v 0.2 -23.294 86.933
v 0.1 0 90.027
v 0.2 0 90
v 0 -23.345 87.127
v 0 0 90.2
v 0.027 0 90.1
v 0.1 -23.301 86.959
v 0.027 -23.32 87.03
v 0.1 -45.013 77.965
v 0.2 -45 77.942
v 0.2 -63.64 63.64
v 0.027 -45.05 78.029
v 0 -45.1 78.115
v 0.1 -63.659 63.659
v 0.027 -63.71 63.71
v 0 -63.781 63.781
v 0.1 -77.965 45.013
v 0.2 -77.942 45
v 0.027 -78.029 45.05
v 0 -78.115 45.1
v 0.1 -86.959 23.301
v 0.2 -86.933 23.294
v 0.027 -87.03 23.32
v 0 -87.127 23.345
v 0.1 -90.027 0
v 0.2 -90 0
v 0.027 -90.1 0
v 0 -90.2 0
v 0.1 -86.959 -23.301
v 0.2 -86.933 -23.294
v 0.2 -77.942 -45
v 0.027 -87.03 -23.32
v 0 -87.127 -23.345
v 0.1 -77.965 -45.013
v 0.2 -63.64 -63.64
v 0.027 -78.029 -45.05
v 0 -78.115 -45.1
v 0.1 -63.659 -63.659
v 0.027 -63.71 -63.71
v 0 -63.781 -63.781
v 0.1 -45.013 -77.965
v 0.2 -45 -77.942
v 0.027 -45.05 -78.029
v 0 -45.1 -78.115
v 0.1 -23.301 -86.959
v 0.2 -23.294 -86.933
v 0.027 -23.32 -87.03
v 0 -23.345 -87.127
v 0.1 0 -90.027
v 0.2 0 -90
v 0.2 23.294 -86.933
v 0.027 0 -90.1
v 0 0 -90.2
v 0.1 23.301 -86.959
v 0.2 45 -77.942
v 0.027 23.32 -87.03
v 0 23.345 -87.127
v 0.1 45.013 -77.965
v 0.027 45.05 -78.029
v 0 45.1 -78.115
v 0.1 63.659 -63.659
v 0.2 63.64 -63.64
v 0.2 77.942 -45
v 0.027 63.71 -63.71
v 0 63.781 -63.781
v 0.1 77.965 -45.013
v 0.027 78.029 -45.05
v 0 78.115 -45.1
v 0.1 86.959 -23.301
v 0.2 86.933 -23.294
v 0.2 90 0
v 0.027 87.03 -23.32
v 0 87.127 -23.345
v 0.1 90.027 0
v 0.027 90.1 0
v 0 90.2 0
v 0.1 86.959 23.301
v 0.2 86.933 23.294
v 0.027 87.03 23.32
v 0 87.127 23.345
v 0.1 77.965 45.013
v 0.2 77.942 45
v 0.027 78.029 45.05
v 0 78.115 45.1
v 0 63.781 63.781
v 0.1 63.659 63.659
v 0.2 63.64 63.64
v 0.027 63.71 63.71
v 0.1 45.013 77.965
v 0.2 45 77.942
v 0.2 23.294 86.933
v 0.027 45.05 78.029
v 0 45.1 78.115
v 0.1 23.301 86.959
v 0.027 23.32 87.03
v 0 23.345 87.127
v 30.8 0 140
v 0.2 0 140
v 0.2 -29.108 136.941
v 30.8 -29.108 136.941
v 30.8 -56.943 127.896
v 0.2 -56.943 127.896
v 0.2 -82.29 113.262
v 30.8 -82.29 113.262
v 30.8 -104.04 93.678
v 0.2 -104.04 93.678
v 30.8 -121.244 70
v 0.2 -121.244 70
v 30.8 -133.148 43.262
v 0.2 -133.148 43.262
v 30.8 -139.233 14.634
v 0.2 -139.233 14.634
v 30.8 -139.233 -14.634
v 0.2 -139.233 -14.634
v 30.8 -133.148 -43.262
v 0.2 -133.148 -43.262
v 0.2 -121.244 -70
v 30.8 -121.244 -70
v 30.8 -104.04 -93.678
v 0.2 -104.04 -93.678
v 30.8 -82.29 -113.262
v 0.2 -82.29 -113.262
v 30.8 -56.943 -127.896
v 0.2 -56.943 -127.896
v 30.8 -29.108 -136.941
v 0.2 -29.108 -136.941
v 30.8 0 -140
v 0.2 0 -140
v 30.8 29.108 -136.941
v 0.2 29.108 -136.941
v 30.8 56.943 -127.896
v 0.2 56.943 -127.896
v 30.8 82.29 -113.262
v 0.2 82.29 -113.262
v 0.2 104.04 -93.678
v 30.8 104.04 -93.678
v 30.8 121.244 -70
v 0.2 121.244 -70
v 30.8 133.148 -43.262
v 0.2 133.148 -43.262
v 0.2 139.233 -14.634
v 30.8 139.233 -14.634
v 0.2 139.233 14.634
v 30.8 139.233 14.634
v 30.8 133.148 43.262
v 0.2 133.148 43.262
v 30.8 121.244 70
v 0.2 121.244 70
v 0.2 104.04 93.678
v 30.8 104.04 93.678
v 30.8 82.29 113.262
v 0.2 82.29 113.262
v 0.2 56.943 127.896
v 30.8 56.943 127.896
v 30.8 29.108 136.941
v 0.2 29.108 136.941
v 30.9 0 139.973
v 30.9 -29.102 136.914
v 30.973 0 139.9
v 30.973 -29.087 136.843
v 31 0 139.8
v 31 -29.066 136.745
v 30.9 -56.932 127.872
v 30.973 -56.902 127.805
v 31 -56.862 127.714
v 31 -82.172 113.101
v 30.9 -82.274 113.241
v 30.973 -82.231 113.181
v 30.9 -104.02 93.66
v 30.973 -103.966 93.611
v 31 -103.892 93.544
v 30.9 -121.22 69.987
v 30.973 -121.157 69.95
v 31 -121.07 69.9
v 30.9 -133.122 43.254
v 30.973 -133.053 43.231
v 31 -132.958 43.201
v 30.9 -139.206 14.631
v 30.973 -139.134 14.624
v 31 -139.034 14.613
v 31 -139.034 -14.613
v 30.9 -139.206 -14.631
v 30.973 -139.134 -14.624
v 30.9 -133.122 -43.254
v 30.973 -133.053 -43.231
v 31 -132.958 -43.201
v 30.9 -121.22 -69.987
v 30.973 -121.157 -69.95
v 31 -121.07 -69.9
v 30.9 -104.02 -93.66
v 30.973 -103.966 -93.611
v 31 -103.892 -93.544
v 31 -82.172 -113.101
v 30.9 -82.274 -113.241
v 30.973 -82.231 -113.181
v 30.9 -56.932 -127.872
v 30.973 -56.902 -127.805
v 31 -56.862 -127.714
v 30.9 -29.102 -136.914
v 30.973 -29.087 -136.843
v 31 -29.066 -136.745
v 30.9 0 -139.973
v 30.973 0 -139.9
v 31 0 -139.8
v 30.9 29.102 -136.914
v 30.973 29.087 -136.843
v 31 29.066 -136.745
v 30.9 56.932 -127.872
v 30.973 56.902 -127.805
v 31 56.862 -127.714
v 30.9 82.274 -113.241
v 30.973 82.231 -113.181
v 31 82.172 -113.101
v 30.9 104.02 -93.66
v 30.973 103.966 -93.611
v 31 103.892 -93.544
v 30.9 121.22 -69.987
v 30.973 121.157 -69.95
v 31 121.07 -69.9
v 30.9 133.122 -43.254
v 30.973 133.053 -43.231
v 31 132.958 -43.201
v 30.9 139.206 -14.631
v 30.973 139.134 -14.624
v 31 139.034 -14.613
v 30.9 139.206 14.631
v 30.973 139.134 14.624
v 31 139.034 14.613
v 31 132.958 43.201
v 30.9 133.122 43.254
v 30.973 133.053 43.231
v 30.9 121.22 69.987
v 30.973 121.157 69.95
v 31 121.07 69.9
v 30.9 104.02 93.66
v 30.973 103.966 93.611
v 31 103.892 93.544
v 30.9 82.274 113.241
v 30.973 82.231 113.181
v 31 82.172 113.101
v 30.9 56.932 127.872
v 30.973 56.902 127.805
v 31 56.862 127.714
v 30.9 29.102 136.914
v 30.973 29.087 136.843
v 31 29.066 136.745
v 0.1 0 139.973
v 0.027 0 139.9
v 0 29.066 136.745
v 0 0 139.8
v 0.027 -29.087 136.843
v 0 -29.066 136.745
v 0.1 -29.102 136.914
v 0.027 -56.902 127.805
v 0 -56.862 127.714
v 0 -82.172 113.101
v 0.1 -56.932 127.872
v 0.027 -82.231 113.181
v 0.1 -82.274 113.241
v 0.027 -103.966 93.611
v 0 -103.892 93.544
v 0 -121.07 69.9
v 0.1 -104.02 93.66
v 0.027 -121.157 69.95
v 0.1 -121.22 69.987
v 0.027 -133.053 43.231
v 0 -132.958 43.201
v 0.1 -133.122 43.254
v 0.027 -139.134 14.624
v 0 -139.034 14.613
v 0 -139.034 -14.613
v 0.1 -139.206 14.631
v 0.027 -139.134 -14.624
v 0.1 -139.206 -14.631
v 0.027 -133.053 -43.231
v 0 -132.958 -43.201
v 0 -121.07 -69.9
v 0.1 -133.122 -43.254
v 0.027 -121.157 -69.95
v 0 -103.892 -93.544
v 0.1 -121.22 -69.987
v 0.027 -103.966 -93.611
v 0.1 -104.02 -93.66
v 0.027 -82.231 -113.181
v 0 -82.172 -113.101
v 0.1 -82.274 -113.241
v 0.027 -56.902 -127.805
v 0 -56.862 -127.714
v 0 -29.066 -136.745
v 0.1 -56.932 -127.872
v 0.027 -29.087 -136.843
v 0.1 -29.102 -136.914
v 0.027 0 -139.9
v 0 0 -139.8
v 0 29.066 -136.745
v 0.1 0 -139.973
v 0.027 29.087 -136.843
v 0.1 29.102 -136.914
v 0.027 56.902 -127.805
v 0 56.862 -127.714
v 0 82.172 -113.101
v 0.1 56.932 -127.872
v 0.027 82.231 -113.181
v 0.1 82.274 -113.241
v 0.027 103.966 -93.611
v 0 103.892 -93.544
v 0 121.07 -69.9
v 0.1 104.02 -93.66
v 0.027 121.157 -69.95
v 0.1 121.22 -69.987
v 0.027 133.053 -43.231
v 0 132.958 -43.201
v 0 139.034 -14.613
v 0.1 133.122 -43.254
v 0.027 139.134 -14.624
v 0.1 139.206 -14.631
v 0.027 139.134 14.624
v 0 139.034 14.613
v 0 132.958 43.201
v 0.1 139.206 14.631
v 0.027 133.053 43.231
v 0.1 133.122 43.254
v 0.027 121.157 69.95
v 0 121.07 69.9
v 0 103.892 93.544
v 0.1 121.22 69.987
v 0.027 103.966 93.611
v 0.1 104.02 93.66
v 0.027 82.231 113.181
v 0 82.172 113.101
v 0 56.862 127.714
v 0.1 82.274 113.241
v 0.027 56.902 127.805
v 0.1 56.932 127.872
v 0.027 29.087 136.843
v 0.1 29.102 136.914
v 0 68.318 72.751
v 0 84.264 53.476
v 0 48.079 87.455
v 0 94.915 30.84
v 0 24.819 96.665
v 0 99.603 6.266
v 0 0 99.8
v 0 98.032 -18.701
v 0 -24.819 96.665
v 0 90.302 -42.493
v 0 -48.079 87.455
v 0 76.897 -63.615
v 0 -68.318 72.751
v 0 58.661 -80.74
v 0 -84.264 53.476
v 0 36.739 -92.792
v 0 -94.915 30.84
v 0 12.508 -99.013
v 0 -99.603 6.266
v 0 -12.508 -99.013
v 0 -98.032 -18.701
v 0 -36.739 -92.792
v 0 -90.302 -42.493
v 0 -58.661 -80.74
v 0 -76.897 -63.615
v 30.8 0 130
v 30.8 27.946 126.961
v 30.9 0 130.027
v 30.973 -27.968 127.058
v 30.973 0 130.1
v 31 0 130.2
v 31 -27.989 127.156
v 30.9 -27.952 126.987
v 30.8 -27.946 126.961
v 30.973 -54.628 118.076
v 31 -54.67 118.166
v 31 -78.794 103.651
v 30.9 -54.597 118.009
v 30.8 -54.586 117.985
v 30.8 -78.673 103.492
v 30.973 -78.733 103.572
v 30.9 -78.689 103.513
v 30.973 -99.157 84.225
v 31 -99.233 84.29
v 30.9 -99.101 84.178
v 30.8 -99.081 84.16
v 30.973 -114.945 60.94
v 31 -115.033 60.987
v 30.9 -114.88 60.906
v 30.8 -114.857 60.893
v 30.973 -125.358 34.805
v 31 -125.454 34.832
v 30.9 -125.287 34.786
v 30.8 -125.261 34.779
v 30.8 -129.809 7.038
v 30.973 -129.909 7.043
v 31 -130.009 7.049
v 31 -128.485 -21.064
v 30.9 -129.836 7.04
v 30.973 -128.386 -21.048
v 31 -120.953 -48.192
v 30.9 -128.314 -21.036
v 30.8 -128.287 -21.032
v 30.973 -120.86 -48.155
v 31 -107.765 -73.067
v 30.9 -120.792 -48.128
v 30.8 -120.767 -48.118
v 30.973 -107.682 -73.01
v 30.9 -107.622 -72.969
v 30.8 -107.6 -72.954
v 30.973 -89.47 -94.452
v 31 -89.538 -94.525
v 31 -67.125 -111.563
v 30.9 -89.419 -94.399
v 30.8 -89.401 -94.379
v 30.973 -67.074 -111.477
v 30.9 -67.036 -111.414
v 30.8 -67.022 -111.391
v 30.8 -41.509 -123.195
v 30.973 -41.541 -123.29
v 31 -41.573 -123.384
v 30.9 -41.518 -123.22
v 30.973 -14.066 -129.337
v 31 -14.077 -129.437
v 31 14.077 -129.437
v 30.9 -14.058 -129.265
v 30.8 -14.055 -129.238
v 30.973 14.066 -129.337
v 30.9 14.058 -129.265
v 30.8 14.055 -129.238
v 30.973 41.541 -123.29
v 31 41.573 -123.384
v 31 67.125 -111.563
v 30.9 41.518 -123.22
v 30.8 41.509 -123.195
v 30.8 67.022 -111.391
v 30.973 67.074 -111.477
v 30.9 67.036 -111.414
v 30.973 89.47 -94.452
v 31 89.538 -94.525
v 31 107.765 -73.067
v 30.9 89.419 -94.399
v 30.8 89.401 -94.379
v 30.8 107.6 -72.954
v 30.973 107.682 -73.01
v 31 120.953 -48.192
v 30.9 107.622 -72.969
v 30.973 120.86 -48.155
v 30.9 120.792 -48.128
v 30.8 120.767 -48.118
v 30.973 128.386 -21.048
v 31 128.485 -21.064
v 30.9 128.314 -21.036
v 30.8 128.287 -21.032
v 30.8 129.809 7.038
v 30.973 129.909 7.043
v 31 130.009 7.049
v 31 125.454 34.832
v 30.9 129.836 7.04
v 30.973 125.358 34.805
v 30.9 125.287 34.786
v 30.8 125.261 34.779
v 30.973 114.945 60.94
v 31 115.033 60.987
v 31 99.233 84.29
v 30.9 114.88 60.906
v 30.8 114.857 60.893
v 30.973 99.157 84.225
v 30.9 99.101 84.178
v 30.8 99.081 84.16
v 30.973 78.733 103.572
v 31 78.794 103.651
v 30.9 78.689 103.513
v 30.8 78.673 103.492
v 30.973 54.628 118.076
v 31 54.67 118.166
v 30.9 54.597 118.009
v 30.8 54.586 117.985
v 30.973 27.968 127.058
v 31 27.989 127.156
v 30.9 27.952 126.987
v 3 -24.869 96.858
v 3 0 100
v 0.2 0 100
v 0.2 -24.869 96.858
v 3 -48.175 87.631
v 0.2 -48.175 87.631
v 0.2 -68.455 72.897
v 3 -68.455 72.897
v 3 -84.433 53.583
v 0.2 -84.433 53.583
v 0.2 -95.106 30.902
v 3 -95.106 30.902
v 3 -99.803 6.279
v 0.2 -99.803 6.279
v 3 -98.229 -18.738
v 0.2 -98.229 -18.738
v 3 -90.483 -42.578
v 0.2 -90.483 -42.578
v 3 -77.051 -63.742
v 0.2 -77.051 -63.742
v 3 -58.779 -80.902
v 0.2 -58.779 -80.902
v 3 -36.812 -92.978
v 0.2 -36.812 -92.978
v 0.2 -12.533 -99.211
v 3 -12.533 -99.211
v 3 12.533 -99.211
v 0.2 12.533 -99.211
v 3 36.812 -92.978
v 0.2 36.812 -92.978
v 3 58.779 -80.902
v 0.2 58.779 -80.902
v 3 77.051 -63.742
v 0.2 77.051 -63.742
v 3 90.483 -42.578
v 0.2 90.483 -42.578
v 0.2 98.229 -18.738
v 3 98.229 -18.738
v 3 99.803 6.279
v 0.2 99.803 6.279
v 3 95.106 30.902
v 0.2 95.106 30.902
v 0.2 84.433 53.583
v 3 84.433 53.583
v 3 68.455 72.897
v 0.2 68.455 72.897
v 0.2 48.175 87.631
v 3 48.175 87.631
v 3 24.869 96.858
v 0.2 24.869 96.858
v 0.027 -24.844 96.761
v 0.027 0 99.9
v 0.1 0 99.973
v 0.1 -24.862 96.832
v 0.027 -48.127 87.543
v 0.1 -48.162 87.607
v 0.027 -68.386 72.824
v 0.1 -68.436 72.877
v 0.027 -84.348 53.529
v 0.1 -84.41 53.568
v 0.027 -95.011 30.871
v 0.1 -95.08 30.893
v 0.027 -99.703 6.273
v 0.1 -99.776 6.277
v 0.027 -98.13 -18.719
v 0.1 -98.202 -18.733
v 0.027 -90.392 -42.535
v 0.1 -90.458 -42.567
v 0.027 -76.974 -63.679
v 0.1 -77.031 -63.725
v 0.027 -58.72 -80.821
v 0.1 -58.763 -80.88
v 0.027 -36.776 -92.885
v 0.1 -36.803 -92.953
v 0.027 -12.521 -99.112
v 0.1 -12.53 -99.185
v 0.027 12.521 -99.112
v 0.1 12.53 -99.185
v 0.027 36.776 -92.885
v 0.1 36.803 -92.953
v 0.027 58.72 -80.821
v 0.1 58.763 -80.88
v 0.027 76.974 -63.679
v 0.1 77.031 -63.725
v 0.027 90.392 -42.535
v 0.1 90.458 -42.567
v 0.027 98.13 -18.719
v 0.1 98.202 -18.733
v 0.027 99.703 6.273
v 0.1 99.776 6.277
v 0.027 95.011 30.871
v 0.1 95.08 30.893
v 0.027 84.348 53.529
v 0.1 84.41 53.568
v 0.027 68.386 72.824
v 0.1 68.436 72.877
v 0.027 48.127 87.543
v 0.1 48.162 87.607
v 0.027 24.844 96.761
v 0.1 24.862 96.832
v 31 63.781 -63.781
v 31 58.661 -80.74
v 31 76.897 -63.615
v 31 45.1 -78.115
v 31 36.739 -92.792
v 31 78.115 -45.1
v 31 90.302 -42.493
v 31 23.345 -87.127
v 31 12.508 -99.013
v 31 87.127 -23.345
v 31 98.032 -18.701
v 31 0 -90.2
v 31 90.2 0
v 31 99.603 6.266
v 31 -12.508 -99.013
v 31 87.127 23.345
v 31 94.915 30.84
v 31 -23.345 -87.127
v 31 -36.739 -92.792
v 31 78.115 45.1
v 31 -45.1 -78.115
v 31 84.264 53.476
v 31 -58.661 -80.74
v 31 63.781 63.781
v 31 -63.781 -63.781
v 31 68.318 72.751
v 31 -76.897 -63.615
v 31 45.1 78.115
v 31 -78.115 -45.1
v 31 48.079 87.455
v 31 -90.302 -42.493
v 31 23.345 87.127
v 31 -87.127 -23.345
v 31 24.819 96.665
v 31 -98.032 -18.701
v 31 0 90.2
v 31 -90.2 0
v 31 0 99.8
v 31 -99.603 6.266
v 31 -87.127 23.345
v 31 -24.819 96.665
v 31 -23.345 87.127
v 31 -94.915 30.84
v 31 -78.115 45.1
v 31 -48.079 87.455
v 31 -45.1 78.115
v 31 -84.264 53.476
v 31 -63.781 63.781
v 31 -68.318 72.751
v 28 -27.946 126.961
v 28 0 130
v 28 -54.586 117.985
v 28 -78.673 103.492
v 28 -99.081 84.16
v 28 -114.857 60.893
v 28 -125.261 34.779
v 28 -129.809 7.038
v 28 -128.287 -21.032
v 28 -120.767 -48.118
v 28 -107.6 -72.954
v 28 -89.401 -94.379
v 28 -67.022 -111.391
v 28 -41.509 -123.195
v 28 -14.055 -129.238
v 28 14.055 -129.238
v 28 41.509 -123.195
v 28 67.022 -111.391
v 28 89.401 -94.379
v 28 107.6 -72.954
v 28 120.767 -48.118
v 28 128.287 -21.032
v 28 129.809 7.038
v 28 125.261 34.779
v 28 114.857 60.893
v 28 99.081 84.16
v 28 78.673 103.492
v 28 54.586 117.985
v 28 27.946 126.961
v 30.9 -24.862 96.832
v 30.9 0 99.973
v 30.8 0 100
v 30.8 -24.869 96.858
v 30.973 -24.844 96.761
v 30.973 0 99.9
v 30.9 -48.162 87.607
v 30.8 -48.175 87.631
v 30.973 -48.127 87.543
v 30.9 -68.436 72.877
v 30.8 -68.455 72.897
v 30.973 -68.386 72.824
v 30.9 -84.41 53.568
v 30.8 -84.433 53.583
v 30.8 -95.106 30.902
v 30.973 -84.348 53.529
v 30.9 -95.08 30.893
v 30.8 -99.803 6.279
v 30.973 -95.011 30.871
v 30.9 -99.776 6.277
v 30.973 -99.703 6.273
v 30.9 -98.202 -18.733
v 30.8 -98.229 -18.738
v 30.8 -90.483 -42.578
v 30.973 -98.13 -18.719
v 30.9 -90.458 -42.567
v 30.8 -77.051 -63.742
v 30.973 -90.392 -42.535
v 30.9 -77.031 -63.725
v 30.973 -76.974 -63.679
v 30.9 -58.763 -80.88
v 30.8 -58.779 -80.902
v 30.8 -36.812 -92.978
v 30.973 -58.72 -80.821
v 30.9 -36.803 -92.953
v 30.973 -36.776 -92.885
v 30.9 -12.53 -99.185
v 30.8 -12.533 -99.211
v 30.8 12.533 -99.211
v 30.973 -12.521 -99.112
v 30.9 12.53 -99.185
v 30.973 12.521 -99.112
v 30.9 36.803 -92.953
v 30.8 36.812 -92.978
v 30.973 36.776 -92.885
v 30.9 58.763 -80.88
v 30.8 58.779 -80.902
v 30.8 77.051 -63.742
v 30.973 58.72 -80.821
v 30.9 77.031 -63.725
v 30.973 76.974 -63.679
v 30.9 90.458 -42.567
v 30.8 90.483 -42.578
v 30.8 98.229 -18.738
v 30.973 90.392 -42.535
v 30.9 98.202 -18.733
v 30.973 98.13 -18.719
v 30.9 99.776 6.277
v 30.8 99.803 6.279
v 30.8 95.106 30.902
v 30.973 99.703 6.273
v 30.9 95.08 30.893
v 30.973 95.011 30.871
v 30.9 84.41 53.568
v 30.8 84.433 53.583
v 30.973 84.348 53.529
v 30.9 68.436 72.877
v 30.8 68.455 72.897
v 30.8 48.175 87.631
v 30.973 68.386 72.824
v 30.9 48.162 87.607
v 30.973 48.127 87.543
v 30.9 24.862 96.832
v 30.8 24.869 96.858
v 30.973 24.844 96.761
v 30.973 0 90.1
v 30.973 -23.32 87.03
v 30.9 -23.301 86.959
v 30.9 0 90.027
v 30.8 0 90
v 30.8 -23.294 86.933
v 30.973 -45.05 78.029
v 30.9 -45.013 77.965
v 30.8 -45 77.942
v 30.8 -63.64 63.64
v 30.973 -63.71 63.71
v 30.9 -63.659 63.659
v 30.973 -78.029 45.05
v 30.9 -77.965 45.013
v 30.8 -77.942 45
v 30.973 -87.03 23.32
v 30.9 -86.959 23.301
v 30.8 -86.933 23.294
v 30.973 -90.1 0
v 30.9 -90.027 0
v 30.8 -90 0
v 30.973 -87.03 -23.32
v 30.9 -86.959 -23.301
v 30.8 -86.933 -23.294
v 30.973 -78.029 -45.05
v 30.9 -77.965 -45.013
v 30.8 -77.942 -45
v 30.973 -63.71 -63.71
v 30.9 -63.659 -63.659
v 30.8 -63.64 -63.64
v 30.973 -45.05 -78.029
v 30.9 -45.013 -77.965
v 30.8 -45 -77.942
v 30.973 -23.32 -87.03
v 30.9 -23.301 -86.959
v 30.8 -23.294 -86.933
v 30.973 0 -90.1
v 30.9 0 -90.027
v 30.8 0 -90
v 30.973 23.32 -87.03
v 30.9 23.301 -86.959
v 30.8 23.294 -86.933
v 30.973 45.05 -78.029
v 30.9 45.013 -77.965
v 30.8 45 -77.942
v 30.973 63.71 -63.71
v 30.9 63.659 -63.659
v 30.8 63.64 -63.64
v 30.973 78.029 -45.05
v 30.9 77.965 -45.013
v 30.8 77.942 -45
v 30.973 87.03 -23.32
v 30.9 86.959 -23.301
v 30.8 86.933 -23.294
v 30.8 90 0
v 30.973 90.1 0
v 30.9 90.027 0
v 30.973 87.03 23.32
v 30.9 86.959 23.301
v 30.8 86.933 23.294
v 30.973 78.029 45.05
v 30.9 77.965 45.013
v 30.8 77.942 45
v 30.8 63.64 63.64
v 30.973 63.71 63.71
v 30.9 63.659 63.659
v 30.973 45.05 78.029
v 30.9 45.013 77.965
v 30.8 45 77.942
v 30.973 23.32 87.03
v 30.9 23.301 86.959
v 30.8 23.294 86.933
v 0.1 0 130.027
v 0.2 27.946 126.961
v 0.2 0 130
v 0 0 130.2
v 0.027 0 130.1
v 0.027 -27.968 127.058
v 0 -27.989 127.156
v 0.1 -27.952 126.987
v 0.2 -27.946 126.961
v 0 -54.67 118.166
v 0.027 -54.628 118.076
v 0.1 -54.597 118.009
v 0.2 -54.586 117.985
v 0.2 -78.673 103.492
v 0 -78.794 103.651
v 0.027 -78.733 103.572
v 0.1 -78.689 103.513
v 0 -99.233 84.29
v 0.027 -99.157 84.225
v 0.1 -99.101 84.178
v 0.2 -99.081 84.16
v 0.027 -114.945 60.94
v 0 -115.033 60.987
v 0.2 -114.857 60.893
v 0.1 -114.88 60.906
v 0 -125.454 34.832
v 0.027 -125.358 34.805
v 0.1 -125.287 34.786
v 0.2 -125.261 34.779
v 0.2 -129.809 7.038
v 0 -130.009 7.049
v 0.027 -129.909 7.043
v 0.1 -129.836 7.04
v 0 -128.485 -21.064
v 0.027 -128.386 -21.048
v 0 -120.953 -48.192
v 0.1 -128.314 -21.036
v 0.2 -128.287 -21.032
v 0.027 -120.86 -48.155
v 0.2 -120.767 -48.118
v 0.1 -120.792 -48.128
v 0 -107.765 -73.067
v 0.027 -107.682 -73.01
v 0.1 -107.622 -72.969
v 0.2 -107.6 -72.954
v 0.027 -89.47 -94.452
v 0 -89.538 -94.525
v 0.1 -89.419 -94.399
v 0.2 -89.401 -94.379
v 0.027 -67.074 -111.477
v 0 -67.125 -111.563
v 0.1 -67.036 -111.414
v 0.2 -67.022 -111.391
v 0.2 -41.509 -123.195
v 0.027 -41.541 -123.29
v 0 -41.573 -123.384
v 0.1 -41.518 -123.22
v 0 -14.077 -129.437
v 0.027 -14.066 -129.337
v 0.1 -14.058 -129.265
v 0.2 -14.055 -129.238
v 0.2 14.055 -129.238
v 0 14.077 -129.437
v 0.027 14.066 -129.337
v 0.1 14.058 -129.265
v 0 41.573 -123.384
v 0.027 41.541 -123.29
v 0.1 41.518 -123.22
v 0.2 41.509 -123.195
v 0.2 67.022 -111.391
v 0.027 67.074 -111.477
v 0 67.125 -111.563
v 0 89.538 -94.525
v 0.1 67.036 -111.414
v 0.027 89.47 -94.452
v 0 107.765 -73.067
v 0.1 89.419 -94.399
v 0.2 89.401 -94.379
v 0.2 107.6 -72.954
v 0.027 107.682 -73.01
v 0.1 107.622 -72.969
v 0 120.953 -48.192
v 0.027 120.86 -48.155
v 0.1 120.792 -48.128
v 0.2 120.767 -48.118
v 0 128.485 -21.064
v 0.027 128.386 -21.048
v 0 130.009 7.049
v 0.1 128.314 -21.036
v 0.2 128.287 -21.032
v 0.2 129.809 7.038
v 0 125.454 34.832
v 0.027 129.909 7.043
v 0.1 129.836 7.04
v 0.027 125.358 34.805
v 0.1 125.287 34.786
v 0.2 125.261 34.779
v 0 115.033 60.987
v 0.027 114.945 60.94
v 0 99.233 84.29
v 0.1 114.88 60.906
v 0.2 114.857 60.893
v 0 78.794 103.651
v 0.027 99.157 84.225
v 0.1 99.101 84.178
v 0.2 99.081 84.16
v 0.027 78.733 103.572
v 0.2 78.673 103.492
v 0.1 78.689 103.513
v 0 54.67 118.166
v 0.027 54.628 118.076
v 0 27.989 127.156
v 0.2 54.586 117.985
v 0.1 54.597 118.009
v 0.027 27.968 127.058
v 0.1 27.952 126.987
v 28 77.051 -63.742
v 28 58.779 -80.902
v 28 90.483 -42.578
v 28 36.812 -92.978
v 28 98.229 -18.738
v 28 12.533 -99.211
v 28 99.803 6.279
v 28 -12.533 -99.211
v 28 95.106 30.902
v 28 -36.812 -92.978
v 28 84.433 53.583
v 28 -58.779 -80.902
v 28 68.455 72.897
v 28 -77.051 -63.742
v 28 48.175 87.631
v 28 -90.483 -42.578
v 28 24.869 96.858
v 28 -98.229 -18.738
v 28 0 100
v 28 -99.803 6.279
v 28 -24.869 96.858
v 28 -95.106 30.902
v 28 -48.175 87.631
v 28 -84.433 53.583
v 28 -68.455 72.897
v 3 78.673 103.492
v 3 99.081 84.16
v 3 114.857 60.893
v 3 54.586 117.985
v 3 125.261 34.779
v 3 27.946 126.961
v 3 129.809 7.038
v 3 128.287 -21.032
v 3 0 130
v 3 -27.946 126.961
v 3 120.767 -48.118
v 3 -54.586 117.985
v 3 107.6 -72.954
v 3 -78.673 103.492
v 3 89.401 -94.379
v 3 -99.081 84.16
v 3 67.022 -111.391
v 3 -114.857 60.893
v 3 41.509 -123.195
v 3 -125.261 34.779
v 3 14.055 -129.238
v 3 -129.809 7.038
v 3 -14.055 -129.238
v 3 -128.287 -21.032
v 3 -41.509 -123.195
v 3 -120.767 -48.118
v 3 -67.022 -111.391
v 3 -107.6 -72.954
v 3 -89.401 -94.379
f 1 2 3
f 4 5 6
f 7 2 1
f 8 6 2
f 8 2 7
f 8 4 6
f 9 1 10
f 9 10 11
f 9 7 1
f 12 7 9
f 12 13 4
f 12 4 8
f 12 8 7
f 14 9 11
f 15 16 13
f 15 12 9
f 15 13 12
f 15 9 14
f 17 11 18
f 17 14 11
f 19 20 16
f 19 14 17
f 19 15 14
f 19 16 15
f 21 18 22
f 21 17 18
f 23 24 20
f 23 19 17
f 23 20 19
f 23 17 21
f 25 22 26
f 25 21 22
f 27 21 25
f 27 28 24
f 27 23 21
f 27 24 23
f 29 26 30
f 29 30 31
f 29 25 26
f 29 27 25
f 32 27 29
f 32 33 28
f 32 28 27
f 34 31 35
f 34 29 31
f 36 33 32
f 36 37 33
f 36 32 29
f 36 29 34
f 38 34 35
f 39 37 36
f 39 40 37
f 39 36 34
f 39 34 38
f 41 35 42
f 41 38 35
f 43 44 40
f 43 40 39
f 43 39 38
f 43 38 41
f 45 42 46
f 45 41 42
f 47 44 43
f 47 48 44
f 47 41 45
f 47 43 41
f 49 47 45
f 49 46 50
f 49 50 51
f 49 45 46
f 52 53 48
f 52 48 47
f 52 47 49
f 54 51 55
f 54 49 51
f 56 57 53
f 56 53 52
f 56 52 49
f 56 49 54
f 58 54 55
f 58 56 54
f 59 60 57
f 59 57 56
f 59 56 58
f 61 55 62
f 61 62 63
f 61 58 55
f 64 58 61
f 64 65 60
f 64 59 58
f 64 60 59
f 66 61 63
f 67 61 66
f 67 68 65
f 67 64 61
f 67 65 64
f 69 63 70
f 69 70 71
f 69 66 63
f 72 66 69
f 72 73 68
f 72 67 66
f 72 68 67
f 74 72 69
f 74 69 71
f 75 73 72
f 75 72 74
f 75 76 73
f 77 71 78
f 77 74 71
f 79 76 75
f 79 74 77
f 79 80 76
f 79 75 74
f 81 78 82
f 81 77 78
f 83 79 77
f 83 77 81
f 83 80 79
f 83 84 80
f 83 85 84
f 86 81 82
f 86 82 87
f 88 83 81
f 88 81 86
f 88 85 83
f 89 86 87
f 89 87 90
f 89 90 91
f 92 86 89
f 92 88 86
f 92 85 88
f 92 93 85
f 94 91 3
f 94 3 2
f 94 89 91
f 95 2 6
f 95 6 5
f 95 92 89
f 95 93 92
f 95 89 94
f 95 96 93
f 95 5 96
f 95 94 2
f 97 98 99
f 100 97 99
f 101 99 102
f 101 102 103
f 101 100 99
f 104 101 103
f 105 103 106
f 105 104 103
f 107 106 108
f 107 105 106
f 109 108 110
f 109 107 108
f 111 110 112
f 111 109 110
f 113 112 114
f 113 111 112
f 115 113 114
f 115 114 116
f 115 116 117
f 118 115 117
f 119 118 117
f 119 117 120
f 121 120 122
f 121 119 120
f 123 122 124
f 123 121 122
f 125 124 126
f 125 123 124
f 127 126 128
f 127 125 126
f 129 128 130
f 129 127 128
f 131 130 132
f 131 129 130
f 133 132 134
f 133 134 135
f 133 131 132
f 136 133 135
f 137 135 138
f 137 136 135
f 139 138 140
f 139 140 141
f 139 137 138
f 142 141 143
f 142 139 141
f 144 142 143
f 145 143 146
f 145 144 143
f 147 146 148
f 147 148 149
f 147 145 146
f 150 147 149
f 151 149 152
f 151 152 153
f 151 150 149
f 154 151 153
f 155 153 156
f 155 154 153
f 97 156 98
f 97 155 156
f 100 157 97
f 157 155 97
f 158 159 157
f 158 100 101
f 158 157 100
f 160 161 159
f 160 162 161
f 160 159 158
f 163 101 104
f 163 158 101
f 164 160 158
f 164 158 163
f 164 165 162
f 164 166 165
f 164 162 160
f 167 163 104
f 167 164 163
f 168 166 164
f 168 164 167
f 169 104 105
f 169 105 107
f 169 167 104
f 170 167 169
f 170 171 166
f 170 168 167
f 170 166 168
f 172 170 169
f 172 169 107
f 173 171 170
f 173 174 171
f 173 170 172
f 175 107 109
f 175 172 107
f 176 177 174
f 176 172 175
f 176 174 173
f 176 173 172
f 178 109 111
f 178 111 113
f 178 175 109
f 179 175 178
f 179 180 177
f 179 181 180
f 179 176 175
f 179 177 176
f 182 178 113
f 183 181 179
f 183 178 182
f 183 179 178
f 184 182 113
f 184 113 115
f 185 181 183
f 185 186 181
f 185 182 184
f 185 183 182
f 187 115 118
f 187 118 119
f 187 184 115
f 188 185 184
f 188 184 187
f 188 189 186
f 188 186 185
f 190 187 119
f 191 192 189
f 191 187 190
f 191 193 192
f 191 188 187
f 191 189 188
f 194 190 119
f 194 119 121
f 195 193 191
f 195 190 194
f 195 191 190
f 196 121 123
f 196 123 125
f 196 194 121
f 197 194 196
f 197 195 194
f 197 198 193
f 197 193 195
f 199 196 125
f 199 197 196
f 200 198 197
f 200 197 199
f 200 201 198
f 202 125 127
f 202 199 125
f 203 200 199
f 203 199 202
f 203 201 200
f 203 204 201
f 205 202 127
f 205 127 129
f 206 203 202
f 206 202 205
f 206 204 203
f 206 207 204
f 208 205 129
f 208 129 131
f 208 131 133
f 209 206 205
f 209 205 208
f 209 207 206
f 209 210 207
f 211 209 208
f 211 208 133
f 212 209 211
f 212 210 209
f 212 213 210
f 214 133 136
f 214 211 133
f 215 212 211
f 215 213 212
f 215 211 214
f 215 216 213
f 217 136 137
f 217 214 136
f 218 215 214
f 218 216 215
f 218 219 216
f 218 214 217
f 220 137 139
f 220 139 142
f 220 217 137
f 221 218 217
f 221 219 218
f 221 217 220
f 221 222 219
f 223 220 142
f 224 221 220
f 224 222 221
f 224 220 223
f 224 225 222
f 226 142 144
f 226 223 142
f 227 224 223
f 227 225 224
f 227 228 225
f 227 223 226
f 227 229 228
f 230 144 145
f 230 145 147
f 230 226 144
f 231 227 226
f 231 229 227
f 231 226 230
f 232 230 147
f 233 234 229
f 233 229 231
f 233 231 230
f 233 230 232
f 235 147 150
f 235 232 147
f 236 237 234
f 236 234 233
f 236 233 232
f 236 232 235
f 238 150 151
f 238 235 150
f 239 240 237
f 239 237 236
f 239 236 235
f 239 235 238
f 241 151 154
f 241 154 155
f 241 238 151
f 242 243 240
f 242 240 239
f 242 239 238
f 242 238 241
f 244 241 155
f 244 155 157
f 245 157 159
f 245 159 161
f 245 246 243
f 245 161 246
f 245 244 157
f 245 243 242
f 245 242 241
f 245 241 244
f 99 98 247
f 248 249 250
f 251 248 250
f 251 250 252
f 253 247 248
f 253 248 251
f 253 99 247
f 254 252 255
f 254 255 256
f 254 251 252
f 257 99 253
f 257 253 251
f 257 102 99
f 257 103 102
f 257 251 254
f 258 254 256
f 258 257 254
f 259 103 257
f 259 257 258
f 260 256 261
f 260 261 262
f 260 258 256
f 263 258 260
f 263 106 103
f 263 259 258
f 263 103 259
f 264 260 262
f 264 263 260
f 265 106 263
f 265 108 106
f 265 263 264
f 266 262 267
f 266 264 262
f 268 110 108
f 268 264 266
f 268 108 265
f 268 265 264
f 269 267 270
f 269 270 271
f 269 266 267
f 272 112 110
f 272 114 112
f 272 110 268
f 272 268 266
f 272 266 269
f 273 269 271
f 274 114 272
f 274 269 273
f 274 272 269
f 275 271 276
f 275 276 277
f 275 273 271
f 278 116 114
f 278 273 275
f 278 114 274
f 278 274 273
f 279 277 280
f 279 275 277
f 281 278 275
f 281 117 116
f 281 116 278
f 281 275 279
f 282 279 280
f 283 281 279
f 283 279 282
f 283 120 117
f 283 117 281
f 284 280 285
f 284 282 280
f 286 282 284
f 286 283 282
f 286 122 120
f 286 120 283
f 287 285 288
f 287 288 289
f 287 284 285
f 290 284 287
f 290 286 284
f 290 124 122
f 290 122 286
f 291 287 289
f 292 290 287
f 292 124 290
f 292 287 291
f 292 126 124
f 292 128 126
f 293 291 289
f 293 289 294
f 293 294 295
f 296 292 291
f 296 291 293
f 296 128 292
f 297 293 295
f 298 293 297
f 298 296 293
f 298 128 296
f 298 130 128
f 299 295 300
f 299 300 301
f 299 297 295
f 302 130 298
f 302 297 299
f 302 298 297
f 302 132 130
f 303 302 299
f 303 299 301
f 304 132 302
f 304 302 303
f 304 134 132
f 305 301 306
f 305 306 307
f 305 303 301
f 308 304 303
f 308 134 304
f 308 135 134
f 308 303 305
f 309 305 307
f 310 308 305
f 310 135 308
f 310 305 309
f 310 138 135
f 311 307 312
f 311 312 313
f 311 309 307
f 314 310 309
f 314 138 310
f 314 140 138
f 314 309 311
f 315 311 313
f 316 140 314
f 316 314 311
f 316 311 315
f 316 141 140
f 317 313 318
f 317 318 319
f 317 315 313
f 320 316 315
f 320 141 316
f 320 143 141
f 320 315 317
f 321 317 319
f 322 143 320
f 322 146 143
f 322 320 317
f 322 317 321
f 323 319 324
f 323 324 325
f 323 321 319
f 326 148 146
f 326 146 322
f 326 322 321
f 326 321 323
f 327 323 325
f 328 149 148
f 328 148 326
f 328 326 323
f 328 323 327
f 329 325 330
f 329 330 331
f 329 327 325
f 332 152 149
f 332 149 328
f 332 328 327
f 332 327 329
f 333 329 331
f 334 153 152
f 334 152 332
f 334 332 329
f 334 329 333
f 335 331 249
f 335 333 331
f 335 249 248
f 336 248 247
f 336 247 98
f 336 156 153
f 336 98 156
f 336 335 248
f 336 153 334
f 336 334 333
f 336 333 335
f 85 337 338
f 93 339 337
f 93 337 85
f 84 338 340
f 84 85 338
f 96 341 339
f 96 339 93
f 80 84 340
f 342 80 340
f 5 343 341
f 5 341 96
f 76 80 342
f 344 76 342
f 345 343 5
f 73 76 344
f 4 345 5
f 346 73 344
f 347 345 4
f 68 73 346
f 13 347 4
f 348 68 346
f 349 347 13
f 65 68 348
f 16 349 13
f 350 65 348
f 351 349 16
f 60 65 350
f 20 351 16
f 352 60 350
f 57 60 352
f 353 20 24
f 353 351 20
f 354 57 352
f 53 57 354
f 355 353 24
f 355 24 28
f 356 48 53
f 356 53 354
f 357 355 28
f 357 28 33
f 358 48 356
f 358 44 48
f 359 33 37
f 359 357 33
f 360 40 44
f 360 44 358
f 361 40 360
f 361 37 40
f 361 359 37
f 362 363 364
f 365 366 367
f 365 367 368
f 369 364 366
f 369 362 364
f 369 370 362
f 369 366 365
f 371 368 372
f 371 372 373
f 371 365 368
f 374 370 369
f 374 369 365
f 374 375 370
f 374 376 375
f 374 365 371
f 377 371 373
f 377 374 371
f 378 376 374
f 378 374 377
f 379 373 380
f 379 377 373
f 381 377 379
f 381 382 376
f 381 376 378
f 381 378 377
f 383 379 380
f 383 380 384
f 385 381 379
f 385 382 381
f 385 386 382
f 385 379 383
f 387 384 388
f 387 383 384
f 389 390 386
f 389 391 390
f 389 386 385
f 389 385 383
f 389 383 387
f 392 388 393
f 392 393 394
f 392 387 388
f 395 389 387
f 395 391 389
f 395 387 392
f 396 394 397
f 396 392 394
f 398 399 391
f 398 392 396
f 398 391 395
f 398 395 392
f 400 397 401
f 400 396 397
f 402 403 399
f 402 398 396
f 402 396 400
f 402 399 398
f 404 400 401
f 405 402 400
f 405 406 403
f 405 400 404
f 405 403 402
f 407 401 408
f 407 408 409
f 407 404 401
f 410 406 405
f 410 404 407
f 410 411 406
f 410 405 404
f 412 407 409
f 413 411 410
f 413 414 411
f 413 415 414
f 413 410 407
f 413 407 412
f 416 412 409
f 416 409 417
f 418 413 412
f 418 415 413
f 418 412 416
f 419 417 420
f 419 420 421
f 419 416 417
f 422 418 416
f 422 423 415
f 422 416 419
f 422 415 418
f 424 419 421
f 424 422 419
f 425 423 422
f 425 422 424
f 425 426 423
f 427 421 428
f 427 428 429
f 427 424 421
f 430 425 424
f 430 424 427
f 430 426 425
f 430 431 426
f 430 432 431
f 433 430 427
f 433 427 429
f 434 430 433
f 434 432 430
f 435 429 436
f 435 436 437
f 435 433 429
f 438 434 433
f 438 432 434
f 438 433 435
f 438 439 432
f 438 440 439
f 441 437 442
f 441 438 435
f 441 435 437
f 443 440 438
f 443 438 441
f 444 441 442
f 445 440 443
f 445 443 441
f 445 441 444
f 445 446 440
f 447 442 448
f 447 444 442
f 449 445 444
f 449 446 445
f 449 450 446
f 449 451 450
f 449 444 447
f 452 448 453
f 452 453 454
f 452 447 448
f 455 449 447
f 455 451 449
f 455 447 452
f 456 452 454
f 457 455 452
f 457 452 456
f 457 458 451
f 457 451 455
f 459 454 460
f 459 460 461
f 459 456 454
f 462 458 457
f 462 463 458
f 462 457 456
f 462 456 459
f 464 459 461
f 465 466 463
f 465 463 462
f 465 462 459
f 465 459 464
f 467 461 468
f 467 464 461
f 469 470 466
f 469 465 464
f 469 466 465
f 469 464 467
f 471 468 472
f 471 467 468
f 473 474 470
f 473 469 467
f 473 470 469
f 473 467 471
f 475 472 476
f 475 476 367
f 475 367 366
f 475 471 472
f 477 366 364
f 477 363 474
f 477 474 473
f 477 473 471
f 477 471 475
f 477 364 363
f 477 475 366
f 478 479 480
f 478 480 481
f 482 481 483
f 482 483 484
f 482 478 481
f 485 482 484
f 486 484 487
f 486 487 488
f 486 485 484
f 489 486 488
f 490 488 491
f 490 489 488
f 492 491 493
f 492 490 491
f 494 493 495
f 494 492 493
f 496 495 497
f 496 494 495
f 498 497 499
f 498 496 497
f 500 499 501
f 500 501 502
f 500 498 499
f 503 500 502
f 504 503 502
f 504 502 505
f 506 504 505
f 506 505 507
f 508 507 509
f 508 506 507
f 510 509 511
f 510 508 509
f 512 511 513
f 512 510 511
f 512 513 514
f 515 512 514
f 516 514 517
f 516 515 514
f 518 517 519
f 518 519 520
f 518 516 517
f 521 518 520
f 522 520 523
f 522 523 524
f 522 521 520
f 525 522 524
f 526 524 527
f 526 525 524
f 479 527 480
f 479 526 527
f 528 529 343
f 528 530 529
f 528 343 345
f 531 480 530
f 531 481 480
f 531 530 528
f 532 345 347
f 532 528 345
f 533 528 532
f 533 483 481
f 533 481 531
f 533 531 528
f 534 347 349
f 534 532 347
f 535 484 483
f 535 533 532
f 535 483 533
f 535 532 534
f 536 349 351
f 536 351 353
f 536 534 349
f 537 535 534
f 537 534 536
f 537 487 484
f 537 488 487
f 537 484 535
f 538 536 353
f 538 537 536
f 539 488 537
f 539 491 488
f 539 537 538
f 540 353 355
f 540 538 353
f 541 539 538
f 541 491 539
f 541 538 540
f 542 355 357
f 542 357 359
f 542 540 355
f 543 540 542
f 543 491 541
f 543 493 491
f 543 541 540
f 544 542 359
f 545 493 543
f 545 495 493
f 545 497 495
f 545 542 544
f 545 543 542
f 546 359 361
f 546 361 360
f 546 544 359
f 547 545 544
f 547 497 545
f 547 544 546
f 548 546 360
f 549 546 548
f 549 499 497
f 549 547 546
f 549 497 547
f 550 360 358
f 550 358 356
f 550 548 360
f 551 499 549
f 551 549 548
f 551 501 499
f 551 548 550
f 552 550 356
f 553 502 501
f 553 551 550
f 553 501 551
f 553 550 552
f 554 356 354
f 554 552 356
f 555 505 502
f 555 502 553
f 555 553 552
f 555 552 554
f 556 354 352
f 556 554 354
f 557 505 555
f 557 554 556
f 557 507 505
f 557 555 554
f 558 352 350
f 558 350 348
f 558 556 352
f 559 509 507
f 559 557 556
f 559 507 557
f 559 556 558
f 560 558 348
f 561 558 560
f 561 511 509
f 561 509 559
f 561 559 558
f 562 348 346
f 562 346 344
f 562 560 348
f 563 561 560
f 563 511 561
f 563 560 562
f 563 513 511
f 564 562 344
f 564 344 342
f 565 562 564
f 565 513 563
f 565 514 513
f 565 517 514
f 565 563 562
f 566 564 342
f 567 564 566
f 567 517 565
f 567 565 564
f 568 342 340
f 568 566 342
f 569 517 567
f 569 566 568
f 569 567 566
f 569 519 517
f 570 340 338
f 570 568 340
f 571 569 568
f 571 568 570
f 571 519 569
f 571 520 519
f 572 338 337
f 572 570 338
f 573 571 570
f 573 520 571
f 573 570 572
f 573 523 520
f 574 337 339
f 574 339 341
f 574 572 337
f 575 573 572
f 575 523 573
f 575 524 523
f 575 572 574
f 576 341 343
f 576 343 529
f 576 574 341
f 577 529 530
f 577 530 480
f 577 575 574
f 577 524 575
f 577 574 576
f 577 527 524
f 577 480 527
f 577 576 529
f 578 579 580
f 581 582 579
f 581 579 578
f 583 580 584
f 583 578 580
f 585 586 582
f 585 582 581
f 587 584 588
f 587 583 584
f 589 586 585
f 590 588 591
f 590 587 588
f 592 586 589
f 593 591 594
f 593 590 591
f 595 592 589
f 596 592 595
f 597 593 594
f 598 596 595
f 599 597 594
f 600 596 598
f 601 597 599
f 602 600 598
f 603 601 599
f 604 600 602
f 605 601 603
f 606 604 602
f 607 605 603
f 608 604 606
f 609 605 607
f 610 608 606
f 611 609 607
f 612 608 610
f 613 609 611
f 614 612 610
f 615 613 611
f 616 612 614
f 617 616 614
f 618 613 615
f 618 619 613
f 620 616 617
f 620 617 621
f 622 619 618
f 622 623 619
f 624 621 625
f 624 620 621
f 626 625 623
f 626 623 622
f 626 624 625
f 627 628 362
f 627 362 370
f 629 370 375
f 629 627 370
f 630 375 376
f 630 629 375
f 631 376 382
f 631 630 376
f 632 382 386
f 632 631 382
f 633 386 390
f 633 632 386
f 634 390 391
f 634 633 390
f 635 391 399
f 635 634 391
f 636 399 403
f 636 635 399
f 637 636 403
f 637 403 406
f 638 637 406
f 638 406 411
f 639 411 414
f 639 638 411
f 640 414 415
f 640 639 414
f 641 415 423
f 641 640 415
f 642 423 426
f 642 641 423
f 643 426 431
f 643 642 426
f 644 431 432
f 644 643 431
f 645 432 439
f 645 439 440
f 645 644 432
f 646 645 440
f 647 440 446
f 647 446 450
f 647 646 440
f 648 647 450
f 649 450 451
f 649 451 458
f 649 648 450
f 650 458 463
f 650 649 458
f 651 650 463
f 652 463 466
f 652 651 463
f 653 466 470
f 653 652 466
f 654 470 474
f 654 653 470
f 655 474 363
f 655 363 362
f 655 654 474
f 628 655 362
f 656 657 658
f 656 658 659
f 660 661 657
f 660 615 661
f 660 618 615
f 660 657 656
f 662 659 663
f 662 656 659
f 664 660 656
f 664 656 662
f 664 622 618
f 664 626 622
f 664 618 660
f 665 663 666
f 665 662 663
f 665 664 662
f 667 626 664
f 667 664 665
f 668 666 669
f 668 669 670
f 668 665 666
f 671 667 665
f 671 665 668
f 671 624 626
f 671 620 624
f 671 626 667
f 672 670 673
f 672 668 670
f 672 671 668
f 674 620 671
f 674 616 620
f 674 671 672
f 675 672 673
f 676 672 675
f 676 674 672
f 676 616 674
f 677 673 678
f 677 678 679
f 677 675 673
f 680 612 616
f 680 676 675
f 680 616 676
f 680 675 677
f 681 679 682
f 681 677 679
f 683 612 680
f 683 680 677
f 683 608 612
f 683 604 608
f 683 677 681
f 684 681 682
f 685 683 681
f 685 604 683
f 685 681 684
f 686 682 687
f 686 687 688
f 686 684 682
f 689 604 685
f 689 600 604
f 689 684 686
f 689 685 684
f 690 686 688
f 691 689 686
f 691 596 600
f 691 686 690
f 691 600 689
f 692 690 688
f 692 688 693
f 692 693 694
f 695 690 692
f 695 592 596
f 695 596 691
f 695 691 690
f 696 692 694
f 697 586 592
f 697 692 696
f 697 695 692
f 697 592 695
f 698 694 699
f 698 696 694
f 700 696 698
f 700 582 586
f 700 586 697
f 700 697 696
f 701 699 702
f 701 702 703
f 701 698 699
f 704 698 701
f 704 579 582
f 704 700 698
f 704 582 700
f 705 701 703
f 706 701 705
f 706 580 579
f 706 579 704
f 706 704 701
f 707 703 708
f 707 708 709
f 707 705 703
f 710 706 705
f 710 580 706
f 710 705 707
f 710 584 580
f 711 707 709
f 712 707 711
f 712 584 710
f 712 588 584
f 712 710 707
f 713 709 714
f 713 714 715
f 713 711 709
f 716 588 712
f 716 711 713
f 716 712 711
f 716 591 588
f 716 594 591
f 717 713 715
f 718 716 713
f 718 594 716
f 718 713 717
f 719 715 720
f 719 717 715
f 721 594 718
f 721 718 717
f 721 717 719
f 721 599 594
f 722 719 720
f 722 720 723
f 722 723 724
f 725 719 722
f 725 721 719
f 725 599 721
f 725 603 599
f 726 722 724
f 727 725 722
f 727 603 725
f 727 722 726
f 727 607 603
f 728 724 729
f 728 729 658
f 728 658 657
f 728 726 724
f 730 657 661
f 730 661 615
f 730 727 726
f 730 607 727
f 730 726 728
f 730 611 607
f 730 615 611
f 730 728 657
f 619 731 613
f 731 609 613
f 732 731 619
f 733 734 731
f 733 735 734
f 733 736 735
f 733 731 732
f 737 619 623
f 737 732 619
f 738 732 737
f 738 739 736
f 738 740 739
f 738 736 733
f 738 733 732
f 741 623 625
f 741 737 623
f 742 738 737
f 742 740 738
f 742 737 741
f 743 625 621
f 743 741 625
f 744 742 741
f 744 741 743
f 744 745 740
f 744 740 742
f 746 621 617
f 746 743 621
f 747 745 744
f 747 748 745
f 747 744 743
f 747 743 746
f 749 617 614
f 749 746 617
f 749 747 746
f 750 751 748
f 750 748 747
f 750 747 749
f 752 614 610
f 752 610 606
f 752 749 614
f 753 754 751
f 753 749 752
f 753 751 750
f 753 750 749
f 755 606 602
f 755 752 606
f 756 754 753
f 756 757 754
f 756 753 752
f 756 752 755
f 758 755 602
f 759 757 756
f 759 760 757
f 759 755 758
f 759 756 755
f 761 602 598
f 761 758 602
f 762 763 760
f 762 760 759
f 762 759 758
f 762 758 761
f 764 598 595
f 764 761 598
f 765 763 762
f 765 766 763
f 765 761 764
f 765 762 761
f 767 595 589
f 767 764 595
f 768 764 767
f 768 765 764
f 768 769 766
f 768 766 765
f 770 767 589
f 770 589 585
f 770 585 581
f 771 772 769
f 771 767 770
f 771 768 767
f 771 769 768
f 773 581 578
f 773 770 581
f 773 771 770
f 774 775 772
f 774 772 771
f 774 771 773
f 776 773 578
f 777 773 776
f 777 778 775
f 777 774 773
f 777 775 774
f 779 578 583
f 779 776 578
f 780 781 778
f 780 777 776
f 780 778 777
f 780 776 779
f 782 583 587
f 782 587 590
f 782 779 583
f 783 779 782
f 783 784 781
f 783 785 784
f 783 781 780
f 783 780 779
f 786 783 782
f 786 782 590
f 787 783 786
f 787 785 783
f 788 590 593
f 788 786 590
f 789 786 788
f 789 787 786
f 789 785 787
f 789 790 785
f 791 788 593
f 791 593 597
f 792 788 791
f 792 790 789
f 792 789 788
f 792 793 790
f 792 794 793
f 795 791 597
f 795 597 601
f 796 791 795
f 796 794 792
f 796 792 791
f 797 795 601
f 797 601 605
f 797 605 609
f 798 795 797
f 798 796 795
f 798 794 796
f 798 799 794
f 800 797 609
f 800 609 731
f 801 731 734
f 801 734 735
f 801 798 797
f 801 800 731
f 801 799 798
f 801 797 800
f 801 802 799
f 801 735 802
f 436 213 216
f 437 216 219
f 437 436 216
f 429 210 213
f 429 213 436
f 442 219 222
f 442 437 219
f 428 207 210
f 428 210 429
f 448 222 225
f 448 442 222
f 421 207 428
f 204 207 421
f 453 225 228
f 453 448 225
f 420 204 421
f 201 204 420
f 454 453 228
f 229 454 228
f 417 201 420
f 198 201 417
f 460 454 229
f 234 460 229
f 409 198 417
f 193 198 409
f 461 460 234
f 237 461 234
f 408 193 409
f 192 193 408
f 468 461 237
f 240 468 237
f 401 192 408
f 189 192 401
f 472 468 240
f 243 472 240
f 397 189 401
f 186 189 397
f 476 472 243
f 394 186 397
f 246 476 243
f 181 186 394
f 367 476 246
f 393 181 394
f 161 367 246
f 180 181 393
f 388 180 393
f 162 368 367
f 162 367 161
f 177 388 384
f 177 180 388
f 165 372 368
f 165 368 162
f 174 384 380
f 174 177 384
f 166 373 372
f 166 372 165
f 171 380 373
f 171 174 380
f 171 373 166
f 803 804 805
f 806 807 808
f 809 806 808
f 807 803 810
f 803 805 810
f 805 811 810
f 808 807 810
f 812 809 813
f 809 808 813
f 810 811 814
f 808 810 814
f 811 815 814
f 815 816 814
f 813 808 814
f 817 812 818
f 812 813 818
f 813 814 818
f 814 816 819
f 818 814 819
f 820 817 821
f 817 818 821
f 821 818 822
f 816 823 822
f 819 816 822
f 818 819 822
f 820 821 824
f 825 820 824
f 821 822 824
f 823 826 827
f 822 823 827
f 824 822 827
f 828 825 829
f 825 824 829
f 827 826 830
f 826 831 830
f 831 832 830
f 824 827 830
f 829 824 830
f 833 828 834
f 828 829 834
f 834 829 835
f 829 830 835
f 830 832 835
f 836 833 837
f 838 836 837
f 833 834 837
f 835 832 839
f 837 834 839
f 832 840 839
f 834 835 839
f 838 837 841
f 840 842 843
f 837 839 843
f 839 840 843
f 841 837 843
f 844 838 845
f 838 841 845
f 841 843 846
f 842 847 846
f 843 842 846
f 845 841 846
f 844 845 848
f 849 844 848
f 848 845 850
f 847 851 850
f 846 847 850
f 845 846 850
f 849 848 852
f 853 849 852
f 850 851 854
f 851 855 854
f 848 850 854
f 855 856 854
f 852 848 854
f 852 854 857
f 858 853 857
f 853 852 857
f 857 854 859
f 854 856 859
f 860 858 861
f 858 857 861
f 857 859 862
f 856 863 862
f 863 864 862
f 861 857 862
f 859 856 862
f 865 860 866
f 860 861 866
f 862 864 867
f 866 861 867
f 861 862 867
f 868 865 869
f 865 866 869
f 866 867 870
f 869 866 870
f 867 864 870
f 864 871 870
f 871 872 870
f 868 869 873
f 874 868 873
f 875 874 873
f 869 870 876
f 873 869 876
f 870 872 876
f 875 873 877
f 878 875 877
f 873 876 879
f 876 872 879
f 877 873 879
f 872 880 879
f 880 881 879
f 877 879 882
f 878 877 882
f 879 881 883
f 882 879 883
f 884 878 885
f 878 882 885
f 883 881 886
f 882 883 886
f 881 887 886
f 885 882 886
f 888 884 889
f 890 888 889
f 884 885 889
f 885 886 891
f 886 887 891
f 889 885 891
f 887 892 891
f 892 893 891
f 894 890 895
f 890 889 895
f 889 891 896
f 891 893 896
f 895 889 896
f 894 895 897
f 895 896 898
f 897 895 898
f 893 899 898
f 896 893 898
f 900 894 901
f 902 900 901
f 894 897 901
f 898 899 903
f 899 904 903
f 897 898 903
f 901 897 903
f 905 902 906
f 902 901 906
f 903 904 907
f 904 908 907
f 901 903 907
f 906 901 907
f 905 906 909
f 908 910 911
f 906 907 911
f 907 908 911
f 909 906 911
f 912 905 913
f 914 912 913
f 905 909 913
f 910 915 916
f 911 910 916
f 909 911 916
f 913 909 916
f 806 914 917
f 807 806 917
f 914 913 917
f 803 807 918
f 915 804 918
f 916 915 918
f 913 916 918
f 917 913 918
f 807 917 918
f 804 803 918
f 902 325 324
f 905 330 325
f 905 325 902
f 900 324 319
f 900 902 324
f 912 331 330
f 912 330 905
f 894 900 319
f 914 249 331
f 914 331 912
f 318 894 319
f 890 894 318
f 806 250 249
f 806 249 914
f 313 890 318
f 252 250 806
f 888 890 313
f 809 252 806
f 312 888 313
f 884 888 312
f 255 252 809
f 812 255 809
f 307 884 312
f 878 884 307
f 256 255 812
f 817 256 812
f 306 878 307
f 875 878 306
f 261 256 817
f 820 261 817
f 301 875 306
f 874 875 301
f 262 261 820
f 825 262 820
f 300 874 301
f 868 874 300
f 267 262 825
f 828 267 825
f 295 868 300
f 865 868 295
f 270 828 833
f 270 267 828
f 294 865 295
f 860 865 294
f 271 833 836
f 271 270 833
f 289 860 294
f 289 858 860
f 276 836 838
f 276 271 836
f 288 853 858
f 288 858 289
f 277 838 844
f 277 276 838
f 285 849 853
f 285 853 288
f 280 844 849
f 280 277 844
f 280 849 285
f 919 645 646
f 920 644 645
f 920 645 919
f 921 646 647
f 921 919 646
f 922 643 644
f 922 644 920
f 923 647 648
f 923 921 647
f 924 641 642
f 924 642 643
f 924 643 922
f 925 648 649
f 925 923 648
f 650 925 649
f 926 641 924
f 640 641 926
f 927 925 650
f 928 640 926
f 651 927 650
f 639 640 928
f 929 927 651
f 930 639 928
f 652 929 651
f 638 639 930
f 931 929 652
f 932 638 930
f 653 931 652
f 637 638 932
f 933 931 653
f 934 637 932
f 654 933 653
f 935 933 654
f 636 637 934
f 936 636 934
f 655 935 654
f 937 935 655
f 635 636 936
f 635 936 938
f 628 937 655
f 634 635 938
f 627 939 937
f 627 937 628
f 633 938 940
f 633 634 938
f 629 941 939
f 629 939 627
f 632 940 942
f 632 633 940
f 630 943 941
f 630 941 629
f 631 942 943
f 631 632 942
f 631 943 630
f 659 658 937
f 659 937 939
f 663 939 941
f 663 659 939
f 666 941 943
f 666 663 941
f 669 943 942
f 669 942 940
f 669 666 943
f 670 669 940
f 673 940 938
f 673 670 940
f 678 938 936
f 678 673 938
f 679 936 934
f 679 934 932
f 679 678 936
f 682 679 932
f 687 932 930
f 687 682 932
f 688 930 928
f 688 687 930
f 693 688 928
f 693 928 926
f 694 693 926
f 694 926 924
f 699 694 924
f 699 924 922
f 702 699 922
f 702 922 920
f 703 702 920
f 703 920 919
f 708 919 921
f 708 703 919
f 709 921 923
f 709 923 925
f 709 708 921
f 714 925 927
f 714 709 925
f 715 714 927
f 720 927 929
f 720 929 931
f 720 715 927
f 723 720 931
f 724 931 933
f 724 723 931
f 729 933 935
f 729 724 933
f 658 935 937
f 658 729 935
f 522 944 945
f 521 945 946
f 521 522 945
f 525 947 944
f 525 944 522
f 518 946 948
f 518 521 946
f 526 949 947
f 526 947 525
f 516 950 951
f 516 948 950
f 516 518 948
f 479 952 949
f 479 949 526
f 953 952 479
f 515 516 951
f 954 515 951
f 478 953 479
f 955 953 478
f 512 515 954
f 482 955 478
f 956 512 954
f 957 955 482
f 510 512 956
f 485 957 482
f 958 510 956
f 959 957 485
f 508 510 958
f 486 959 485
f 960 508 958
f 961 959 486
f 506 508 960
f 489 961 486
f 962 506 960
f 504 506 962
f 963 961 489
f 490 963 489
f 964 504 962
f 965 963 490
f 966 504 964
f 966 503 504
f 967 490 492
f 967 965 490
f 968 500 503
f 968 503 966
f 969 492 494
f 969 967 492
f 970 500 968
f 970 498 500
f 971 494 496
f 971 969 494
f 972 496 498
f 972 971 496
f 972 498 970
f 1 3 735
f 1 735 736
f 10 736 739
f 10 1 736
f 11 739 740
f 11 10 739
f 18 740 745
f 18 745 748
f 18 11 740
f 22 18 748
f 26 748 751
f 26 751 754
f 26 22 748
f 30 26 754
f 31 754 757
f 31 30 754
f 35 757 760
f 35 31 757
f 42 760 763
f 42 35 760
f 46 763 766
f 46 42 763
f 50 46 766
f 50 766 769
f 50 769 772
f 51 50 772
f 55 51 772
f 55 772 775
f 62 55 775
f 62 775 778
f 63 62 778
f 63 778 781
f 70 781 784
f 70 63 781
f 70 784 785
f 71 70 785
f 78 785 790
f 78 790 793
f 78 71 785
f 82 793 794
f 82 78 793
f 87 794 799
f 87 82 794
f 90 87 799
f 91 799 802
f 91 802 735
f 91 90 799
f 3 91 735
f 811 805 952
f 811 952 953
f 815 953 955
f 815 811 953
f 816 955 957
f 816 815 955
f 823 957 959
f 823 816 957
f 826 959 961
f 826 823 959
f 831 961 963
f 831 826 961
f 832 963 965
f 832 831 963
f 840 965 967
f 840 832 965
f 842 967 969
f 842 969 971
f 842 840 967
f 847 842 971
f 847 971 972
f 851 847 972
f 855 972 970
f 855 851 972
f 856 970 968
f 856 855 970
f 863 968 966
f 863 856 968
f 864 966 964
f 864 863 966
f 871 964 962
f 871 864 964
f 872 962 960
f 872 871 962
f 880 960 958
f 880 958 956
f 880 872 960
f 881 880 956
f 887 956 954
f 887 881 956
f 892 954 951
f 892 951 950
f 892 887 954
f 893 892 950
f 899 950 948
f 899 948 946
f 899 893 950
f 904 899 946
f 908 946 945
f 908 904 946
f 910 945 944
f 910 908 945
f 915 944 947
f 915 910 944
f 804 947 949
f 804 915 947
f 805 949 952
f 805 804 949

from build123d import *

# Parameters (mm, degrees)
VERRUNDUNG1_R = 0.2


with BuildPart() as part:
    # Skizze1 → Rotation1 (revolve)
    with BuildSketch(Plane.XY, mode=Mode.PRIVATE) as rotation1_sk:
        Polygon((0, 130), (0, 140), (31, 140), (31, 130), (28, 130), (28, 100), (31, 100), (31, 90), (0, 90), (0, 100), (3, 100), (3, 130), align=None)
    revolve(rotation1_sk.sketch.rotate(Axis((0, 0, 0), (1, 0, 0)), 90), axis=Axis((0, 0, 0), (1, 0, 0)))  # turned: the seam where the file's is

    # Verrundung1
    verrundung1_edges = [part.edges().sort_by_distance(p)[0] for p in [
        (0, 0, -130),
        (0, 0, -140),
        (31, 0, -140),
        (31, 0, -130),
        (31, 0, -100),
        (31, 0, -90),
        (0, 0, -90),
        (0, 0, -100),
    ]]
    fillet(verrundung1_edges, radius=VERRUNDUNG1_R)


solid = part.part
